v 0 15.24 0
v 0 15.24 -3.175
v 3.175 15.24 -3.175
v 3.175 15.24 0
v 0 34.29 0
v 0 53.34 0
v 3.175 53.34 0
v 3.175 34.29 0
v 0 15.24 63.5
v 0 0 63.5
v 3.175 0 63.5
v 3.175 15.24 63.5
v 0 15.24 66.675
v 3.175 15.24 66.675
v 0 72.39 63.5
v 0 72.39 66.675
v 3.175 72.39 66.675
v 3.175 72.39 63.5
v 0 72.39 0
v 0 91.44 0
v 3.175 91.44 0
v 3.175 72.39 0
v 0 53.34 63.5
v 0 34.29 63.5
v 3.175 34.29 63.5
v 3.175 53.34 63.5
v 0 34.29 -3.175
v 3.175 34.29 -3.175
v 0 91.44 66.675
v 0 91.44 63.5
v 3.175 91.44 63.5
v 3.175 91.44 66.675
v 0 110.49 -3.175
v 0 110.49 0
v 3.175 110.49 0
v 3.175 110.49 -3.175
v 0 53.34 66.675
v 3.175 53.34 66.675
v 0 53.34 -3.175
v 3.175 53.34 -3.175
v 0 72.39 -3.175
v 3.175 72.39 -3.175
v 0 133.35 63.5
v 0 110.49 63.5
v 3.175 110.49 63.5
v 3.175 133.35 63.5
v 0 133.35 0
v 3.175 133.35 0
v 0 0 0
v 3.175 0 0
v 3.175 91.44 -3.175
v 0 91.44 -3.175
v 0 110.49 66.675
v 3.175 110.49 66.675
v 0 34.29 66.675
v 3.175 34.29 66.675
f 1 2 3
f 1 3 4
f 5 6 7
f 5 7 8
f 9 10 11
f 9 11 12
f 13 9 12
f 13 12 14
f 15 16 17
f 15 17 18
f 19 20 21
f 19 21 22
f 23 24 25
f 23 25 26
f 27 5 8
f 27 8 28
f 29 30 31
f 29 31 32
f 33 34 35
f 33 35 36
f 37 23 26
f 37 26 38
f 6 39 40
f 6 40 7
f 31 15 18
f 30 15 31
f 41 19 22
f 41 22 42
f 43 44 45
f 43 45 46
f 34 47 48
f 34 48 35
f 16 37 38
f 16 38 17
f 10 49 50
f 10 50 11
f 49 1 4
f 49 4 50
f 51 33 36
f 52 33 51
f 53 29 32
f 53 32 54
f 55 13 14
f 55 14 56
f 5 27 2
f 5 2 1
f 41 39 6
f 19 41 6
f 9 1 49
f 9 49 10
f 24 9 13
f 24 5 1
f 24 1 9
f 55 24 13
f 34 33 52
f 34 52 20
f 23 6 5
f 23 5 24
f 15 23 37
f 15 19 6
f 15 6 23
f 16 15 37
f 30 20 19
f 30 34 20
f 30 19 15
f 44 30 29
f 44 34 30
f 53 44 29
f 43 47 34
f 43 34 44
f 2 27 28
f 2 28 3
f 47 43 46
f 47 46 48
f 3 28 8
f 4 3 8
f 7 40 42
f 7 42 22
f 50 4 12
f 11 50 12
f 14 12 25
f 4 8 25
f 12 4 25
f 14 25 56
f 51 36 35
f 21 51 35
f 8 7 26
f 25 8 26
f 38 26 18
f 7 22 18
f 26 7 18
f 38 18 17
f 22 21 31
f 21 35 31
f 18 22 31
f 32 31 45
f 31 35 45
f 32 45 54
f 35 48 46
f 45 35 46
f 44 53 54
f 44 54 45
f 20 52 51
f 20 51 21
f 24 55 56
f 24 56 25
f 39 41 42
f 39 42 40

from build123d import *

# Parameters (mm, degrees)
BOSS_EXTRUDE1_DEPTH = 3.175


with BuildPart() as part:
    # Sketch1 → Boss-Extrude1 (new body)
    with BuildSketch(Plane(origin=(0, 0, 0), x_dir=(0, 0, -1), z_dir=(1, 0, 0))):
        Polygon((0, 110.49), (3.175, 110.49), (3.175, 91.44), (0, 91.44), (0, 72.39), (3.175, 72.39), (3.175, 53.34), (0, 53.34), (0, 34.29), (3.175, 34.29), (3.175, 15.24), (0, 15.24), (0, 0), (-63.5, 0), (-63.5, 15.24), (-66.675, 15.24), (-66.675, 34.29), (-63.5, 34.29), (-63.5, 53.34), (-66.675, 53.34), (-66.675, 72.39), (-63.5, 72.39), (-63.5, 91.44), (-66.675, 91.44), (-66.675, 110.49), (-63.5, 110.49), (-63.5, 133.35), (0, 133.35), align=None)
    extrude(amount=BOSS_EXTRUDE1_DEPTH)


solid = part.part
